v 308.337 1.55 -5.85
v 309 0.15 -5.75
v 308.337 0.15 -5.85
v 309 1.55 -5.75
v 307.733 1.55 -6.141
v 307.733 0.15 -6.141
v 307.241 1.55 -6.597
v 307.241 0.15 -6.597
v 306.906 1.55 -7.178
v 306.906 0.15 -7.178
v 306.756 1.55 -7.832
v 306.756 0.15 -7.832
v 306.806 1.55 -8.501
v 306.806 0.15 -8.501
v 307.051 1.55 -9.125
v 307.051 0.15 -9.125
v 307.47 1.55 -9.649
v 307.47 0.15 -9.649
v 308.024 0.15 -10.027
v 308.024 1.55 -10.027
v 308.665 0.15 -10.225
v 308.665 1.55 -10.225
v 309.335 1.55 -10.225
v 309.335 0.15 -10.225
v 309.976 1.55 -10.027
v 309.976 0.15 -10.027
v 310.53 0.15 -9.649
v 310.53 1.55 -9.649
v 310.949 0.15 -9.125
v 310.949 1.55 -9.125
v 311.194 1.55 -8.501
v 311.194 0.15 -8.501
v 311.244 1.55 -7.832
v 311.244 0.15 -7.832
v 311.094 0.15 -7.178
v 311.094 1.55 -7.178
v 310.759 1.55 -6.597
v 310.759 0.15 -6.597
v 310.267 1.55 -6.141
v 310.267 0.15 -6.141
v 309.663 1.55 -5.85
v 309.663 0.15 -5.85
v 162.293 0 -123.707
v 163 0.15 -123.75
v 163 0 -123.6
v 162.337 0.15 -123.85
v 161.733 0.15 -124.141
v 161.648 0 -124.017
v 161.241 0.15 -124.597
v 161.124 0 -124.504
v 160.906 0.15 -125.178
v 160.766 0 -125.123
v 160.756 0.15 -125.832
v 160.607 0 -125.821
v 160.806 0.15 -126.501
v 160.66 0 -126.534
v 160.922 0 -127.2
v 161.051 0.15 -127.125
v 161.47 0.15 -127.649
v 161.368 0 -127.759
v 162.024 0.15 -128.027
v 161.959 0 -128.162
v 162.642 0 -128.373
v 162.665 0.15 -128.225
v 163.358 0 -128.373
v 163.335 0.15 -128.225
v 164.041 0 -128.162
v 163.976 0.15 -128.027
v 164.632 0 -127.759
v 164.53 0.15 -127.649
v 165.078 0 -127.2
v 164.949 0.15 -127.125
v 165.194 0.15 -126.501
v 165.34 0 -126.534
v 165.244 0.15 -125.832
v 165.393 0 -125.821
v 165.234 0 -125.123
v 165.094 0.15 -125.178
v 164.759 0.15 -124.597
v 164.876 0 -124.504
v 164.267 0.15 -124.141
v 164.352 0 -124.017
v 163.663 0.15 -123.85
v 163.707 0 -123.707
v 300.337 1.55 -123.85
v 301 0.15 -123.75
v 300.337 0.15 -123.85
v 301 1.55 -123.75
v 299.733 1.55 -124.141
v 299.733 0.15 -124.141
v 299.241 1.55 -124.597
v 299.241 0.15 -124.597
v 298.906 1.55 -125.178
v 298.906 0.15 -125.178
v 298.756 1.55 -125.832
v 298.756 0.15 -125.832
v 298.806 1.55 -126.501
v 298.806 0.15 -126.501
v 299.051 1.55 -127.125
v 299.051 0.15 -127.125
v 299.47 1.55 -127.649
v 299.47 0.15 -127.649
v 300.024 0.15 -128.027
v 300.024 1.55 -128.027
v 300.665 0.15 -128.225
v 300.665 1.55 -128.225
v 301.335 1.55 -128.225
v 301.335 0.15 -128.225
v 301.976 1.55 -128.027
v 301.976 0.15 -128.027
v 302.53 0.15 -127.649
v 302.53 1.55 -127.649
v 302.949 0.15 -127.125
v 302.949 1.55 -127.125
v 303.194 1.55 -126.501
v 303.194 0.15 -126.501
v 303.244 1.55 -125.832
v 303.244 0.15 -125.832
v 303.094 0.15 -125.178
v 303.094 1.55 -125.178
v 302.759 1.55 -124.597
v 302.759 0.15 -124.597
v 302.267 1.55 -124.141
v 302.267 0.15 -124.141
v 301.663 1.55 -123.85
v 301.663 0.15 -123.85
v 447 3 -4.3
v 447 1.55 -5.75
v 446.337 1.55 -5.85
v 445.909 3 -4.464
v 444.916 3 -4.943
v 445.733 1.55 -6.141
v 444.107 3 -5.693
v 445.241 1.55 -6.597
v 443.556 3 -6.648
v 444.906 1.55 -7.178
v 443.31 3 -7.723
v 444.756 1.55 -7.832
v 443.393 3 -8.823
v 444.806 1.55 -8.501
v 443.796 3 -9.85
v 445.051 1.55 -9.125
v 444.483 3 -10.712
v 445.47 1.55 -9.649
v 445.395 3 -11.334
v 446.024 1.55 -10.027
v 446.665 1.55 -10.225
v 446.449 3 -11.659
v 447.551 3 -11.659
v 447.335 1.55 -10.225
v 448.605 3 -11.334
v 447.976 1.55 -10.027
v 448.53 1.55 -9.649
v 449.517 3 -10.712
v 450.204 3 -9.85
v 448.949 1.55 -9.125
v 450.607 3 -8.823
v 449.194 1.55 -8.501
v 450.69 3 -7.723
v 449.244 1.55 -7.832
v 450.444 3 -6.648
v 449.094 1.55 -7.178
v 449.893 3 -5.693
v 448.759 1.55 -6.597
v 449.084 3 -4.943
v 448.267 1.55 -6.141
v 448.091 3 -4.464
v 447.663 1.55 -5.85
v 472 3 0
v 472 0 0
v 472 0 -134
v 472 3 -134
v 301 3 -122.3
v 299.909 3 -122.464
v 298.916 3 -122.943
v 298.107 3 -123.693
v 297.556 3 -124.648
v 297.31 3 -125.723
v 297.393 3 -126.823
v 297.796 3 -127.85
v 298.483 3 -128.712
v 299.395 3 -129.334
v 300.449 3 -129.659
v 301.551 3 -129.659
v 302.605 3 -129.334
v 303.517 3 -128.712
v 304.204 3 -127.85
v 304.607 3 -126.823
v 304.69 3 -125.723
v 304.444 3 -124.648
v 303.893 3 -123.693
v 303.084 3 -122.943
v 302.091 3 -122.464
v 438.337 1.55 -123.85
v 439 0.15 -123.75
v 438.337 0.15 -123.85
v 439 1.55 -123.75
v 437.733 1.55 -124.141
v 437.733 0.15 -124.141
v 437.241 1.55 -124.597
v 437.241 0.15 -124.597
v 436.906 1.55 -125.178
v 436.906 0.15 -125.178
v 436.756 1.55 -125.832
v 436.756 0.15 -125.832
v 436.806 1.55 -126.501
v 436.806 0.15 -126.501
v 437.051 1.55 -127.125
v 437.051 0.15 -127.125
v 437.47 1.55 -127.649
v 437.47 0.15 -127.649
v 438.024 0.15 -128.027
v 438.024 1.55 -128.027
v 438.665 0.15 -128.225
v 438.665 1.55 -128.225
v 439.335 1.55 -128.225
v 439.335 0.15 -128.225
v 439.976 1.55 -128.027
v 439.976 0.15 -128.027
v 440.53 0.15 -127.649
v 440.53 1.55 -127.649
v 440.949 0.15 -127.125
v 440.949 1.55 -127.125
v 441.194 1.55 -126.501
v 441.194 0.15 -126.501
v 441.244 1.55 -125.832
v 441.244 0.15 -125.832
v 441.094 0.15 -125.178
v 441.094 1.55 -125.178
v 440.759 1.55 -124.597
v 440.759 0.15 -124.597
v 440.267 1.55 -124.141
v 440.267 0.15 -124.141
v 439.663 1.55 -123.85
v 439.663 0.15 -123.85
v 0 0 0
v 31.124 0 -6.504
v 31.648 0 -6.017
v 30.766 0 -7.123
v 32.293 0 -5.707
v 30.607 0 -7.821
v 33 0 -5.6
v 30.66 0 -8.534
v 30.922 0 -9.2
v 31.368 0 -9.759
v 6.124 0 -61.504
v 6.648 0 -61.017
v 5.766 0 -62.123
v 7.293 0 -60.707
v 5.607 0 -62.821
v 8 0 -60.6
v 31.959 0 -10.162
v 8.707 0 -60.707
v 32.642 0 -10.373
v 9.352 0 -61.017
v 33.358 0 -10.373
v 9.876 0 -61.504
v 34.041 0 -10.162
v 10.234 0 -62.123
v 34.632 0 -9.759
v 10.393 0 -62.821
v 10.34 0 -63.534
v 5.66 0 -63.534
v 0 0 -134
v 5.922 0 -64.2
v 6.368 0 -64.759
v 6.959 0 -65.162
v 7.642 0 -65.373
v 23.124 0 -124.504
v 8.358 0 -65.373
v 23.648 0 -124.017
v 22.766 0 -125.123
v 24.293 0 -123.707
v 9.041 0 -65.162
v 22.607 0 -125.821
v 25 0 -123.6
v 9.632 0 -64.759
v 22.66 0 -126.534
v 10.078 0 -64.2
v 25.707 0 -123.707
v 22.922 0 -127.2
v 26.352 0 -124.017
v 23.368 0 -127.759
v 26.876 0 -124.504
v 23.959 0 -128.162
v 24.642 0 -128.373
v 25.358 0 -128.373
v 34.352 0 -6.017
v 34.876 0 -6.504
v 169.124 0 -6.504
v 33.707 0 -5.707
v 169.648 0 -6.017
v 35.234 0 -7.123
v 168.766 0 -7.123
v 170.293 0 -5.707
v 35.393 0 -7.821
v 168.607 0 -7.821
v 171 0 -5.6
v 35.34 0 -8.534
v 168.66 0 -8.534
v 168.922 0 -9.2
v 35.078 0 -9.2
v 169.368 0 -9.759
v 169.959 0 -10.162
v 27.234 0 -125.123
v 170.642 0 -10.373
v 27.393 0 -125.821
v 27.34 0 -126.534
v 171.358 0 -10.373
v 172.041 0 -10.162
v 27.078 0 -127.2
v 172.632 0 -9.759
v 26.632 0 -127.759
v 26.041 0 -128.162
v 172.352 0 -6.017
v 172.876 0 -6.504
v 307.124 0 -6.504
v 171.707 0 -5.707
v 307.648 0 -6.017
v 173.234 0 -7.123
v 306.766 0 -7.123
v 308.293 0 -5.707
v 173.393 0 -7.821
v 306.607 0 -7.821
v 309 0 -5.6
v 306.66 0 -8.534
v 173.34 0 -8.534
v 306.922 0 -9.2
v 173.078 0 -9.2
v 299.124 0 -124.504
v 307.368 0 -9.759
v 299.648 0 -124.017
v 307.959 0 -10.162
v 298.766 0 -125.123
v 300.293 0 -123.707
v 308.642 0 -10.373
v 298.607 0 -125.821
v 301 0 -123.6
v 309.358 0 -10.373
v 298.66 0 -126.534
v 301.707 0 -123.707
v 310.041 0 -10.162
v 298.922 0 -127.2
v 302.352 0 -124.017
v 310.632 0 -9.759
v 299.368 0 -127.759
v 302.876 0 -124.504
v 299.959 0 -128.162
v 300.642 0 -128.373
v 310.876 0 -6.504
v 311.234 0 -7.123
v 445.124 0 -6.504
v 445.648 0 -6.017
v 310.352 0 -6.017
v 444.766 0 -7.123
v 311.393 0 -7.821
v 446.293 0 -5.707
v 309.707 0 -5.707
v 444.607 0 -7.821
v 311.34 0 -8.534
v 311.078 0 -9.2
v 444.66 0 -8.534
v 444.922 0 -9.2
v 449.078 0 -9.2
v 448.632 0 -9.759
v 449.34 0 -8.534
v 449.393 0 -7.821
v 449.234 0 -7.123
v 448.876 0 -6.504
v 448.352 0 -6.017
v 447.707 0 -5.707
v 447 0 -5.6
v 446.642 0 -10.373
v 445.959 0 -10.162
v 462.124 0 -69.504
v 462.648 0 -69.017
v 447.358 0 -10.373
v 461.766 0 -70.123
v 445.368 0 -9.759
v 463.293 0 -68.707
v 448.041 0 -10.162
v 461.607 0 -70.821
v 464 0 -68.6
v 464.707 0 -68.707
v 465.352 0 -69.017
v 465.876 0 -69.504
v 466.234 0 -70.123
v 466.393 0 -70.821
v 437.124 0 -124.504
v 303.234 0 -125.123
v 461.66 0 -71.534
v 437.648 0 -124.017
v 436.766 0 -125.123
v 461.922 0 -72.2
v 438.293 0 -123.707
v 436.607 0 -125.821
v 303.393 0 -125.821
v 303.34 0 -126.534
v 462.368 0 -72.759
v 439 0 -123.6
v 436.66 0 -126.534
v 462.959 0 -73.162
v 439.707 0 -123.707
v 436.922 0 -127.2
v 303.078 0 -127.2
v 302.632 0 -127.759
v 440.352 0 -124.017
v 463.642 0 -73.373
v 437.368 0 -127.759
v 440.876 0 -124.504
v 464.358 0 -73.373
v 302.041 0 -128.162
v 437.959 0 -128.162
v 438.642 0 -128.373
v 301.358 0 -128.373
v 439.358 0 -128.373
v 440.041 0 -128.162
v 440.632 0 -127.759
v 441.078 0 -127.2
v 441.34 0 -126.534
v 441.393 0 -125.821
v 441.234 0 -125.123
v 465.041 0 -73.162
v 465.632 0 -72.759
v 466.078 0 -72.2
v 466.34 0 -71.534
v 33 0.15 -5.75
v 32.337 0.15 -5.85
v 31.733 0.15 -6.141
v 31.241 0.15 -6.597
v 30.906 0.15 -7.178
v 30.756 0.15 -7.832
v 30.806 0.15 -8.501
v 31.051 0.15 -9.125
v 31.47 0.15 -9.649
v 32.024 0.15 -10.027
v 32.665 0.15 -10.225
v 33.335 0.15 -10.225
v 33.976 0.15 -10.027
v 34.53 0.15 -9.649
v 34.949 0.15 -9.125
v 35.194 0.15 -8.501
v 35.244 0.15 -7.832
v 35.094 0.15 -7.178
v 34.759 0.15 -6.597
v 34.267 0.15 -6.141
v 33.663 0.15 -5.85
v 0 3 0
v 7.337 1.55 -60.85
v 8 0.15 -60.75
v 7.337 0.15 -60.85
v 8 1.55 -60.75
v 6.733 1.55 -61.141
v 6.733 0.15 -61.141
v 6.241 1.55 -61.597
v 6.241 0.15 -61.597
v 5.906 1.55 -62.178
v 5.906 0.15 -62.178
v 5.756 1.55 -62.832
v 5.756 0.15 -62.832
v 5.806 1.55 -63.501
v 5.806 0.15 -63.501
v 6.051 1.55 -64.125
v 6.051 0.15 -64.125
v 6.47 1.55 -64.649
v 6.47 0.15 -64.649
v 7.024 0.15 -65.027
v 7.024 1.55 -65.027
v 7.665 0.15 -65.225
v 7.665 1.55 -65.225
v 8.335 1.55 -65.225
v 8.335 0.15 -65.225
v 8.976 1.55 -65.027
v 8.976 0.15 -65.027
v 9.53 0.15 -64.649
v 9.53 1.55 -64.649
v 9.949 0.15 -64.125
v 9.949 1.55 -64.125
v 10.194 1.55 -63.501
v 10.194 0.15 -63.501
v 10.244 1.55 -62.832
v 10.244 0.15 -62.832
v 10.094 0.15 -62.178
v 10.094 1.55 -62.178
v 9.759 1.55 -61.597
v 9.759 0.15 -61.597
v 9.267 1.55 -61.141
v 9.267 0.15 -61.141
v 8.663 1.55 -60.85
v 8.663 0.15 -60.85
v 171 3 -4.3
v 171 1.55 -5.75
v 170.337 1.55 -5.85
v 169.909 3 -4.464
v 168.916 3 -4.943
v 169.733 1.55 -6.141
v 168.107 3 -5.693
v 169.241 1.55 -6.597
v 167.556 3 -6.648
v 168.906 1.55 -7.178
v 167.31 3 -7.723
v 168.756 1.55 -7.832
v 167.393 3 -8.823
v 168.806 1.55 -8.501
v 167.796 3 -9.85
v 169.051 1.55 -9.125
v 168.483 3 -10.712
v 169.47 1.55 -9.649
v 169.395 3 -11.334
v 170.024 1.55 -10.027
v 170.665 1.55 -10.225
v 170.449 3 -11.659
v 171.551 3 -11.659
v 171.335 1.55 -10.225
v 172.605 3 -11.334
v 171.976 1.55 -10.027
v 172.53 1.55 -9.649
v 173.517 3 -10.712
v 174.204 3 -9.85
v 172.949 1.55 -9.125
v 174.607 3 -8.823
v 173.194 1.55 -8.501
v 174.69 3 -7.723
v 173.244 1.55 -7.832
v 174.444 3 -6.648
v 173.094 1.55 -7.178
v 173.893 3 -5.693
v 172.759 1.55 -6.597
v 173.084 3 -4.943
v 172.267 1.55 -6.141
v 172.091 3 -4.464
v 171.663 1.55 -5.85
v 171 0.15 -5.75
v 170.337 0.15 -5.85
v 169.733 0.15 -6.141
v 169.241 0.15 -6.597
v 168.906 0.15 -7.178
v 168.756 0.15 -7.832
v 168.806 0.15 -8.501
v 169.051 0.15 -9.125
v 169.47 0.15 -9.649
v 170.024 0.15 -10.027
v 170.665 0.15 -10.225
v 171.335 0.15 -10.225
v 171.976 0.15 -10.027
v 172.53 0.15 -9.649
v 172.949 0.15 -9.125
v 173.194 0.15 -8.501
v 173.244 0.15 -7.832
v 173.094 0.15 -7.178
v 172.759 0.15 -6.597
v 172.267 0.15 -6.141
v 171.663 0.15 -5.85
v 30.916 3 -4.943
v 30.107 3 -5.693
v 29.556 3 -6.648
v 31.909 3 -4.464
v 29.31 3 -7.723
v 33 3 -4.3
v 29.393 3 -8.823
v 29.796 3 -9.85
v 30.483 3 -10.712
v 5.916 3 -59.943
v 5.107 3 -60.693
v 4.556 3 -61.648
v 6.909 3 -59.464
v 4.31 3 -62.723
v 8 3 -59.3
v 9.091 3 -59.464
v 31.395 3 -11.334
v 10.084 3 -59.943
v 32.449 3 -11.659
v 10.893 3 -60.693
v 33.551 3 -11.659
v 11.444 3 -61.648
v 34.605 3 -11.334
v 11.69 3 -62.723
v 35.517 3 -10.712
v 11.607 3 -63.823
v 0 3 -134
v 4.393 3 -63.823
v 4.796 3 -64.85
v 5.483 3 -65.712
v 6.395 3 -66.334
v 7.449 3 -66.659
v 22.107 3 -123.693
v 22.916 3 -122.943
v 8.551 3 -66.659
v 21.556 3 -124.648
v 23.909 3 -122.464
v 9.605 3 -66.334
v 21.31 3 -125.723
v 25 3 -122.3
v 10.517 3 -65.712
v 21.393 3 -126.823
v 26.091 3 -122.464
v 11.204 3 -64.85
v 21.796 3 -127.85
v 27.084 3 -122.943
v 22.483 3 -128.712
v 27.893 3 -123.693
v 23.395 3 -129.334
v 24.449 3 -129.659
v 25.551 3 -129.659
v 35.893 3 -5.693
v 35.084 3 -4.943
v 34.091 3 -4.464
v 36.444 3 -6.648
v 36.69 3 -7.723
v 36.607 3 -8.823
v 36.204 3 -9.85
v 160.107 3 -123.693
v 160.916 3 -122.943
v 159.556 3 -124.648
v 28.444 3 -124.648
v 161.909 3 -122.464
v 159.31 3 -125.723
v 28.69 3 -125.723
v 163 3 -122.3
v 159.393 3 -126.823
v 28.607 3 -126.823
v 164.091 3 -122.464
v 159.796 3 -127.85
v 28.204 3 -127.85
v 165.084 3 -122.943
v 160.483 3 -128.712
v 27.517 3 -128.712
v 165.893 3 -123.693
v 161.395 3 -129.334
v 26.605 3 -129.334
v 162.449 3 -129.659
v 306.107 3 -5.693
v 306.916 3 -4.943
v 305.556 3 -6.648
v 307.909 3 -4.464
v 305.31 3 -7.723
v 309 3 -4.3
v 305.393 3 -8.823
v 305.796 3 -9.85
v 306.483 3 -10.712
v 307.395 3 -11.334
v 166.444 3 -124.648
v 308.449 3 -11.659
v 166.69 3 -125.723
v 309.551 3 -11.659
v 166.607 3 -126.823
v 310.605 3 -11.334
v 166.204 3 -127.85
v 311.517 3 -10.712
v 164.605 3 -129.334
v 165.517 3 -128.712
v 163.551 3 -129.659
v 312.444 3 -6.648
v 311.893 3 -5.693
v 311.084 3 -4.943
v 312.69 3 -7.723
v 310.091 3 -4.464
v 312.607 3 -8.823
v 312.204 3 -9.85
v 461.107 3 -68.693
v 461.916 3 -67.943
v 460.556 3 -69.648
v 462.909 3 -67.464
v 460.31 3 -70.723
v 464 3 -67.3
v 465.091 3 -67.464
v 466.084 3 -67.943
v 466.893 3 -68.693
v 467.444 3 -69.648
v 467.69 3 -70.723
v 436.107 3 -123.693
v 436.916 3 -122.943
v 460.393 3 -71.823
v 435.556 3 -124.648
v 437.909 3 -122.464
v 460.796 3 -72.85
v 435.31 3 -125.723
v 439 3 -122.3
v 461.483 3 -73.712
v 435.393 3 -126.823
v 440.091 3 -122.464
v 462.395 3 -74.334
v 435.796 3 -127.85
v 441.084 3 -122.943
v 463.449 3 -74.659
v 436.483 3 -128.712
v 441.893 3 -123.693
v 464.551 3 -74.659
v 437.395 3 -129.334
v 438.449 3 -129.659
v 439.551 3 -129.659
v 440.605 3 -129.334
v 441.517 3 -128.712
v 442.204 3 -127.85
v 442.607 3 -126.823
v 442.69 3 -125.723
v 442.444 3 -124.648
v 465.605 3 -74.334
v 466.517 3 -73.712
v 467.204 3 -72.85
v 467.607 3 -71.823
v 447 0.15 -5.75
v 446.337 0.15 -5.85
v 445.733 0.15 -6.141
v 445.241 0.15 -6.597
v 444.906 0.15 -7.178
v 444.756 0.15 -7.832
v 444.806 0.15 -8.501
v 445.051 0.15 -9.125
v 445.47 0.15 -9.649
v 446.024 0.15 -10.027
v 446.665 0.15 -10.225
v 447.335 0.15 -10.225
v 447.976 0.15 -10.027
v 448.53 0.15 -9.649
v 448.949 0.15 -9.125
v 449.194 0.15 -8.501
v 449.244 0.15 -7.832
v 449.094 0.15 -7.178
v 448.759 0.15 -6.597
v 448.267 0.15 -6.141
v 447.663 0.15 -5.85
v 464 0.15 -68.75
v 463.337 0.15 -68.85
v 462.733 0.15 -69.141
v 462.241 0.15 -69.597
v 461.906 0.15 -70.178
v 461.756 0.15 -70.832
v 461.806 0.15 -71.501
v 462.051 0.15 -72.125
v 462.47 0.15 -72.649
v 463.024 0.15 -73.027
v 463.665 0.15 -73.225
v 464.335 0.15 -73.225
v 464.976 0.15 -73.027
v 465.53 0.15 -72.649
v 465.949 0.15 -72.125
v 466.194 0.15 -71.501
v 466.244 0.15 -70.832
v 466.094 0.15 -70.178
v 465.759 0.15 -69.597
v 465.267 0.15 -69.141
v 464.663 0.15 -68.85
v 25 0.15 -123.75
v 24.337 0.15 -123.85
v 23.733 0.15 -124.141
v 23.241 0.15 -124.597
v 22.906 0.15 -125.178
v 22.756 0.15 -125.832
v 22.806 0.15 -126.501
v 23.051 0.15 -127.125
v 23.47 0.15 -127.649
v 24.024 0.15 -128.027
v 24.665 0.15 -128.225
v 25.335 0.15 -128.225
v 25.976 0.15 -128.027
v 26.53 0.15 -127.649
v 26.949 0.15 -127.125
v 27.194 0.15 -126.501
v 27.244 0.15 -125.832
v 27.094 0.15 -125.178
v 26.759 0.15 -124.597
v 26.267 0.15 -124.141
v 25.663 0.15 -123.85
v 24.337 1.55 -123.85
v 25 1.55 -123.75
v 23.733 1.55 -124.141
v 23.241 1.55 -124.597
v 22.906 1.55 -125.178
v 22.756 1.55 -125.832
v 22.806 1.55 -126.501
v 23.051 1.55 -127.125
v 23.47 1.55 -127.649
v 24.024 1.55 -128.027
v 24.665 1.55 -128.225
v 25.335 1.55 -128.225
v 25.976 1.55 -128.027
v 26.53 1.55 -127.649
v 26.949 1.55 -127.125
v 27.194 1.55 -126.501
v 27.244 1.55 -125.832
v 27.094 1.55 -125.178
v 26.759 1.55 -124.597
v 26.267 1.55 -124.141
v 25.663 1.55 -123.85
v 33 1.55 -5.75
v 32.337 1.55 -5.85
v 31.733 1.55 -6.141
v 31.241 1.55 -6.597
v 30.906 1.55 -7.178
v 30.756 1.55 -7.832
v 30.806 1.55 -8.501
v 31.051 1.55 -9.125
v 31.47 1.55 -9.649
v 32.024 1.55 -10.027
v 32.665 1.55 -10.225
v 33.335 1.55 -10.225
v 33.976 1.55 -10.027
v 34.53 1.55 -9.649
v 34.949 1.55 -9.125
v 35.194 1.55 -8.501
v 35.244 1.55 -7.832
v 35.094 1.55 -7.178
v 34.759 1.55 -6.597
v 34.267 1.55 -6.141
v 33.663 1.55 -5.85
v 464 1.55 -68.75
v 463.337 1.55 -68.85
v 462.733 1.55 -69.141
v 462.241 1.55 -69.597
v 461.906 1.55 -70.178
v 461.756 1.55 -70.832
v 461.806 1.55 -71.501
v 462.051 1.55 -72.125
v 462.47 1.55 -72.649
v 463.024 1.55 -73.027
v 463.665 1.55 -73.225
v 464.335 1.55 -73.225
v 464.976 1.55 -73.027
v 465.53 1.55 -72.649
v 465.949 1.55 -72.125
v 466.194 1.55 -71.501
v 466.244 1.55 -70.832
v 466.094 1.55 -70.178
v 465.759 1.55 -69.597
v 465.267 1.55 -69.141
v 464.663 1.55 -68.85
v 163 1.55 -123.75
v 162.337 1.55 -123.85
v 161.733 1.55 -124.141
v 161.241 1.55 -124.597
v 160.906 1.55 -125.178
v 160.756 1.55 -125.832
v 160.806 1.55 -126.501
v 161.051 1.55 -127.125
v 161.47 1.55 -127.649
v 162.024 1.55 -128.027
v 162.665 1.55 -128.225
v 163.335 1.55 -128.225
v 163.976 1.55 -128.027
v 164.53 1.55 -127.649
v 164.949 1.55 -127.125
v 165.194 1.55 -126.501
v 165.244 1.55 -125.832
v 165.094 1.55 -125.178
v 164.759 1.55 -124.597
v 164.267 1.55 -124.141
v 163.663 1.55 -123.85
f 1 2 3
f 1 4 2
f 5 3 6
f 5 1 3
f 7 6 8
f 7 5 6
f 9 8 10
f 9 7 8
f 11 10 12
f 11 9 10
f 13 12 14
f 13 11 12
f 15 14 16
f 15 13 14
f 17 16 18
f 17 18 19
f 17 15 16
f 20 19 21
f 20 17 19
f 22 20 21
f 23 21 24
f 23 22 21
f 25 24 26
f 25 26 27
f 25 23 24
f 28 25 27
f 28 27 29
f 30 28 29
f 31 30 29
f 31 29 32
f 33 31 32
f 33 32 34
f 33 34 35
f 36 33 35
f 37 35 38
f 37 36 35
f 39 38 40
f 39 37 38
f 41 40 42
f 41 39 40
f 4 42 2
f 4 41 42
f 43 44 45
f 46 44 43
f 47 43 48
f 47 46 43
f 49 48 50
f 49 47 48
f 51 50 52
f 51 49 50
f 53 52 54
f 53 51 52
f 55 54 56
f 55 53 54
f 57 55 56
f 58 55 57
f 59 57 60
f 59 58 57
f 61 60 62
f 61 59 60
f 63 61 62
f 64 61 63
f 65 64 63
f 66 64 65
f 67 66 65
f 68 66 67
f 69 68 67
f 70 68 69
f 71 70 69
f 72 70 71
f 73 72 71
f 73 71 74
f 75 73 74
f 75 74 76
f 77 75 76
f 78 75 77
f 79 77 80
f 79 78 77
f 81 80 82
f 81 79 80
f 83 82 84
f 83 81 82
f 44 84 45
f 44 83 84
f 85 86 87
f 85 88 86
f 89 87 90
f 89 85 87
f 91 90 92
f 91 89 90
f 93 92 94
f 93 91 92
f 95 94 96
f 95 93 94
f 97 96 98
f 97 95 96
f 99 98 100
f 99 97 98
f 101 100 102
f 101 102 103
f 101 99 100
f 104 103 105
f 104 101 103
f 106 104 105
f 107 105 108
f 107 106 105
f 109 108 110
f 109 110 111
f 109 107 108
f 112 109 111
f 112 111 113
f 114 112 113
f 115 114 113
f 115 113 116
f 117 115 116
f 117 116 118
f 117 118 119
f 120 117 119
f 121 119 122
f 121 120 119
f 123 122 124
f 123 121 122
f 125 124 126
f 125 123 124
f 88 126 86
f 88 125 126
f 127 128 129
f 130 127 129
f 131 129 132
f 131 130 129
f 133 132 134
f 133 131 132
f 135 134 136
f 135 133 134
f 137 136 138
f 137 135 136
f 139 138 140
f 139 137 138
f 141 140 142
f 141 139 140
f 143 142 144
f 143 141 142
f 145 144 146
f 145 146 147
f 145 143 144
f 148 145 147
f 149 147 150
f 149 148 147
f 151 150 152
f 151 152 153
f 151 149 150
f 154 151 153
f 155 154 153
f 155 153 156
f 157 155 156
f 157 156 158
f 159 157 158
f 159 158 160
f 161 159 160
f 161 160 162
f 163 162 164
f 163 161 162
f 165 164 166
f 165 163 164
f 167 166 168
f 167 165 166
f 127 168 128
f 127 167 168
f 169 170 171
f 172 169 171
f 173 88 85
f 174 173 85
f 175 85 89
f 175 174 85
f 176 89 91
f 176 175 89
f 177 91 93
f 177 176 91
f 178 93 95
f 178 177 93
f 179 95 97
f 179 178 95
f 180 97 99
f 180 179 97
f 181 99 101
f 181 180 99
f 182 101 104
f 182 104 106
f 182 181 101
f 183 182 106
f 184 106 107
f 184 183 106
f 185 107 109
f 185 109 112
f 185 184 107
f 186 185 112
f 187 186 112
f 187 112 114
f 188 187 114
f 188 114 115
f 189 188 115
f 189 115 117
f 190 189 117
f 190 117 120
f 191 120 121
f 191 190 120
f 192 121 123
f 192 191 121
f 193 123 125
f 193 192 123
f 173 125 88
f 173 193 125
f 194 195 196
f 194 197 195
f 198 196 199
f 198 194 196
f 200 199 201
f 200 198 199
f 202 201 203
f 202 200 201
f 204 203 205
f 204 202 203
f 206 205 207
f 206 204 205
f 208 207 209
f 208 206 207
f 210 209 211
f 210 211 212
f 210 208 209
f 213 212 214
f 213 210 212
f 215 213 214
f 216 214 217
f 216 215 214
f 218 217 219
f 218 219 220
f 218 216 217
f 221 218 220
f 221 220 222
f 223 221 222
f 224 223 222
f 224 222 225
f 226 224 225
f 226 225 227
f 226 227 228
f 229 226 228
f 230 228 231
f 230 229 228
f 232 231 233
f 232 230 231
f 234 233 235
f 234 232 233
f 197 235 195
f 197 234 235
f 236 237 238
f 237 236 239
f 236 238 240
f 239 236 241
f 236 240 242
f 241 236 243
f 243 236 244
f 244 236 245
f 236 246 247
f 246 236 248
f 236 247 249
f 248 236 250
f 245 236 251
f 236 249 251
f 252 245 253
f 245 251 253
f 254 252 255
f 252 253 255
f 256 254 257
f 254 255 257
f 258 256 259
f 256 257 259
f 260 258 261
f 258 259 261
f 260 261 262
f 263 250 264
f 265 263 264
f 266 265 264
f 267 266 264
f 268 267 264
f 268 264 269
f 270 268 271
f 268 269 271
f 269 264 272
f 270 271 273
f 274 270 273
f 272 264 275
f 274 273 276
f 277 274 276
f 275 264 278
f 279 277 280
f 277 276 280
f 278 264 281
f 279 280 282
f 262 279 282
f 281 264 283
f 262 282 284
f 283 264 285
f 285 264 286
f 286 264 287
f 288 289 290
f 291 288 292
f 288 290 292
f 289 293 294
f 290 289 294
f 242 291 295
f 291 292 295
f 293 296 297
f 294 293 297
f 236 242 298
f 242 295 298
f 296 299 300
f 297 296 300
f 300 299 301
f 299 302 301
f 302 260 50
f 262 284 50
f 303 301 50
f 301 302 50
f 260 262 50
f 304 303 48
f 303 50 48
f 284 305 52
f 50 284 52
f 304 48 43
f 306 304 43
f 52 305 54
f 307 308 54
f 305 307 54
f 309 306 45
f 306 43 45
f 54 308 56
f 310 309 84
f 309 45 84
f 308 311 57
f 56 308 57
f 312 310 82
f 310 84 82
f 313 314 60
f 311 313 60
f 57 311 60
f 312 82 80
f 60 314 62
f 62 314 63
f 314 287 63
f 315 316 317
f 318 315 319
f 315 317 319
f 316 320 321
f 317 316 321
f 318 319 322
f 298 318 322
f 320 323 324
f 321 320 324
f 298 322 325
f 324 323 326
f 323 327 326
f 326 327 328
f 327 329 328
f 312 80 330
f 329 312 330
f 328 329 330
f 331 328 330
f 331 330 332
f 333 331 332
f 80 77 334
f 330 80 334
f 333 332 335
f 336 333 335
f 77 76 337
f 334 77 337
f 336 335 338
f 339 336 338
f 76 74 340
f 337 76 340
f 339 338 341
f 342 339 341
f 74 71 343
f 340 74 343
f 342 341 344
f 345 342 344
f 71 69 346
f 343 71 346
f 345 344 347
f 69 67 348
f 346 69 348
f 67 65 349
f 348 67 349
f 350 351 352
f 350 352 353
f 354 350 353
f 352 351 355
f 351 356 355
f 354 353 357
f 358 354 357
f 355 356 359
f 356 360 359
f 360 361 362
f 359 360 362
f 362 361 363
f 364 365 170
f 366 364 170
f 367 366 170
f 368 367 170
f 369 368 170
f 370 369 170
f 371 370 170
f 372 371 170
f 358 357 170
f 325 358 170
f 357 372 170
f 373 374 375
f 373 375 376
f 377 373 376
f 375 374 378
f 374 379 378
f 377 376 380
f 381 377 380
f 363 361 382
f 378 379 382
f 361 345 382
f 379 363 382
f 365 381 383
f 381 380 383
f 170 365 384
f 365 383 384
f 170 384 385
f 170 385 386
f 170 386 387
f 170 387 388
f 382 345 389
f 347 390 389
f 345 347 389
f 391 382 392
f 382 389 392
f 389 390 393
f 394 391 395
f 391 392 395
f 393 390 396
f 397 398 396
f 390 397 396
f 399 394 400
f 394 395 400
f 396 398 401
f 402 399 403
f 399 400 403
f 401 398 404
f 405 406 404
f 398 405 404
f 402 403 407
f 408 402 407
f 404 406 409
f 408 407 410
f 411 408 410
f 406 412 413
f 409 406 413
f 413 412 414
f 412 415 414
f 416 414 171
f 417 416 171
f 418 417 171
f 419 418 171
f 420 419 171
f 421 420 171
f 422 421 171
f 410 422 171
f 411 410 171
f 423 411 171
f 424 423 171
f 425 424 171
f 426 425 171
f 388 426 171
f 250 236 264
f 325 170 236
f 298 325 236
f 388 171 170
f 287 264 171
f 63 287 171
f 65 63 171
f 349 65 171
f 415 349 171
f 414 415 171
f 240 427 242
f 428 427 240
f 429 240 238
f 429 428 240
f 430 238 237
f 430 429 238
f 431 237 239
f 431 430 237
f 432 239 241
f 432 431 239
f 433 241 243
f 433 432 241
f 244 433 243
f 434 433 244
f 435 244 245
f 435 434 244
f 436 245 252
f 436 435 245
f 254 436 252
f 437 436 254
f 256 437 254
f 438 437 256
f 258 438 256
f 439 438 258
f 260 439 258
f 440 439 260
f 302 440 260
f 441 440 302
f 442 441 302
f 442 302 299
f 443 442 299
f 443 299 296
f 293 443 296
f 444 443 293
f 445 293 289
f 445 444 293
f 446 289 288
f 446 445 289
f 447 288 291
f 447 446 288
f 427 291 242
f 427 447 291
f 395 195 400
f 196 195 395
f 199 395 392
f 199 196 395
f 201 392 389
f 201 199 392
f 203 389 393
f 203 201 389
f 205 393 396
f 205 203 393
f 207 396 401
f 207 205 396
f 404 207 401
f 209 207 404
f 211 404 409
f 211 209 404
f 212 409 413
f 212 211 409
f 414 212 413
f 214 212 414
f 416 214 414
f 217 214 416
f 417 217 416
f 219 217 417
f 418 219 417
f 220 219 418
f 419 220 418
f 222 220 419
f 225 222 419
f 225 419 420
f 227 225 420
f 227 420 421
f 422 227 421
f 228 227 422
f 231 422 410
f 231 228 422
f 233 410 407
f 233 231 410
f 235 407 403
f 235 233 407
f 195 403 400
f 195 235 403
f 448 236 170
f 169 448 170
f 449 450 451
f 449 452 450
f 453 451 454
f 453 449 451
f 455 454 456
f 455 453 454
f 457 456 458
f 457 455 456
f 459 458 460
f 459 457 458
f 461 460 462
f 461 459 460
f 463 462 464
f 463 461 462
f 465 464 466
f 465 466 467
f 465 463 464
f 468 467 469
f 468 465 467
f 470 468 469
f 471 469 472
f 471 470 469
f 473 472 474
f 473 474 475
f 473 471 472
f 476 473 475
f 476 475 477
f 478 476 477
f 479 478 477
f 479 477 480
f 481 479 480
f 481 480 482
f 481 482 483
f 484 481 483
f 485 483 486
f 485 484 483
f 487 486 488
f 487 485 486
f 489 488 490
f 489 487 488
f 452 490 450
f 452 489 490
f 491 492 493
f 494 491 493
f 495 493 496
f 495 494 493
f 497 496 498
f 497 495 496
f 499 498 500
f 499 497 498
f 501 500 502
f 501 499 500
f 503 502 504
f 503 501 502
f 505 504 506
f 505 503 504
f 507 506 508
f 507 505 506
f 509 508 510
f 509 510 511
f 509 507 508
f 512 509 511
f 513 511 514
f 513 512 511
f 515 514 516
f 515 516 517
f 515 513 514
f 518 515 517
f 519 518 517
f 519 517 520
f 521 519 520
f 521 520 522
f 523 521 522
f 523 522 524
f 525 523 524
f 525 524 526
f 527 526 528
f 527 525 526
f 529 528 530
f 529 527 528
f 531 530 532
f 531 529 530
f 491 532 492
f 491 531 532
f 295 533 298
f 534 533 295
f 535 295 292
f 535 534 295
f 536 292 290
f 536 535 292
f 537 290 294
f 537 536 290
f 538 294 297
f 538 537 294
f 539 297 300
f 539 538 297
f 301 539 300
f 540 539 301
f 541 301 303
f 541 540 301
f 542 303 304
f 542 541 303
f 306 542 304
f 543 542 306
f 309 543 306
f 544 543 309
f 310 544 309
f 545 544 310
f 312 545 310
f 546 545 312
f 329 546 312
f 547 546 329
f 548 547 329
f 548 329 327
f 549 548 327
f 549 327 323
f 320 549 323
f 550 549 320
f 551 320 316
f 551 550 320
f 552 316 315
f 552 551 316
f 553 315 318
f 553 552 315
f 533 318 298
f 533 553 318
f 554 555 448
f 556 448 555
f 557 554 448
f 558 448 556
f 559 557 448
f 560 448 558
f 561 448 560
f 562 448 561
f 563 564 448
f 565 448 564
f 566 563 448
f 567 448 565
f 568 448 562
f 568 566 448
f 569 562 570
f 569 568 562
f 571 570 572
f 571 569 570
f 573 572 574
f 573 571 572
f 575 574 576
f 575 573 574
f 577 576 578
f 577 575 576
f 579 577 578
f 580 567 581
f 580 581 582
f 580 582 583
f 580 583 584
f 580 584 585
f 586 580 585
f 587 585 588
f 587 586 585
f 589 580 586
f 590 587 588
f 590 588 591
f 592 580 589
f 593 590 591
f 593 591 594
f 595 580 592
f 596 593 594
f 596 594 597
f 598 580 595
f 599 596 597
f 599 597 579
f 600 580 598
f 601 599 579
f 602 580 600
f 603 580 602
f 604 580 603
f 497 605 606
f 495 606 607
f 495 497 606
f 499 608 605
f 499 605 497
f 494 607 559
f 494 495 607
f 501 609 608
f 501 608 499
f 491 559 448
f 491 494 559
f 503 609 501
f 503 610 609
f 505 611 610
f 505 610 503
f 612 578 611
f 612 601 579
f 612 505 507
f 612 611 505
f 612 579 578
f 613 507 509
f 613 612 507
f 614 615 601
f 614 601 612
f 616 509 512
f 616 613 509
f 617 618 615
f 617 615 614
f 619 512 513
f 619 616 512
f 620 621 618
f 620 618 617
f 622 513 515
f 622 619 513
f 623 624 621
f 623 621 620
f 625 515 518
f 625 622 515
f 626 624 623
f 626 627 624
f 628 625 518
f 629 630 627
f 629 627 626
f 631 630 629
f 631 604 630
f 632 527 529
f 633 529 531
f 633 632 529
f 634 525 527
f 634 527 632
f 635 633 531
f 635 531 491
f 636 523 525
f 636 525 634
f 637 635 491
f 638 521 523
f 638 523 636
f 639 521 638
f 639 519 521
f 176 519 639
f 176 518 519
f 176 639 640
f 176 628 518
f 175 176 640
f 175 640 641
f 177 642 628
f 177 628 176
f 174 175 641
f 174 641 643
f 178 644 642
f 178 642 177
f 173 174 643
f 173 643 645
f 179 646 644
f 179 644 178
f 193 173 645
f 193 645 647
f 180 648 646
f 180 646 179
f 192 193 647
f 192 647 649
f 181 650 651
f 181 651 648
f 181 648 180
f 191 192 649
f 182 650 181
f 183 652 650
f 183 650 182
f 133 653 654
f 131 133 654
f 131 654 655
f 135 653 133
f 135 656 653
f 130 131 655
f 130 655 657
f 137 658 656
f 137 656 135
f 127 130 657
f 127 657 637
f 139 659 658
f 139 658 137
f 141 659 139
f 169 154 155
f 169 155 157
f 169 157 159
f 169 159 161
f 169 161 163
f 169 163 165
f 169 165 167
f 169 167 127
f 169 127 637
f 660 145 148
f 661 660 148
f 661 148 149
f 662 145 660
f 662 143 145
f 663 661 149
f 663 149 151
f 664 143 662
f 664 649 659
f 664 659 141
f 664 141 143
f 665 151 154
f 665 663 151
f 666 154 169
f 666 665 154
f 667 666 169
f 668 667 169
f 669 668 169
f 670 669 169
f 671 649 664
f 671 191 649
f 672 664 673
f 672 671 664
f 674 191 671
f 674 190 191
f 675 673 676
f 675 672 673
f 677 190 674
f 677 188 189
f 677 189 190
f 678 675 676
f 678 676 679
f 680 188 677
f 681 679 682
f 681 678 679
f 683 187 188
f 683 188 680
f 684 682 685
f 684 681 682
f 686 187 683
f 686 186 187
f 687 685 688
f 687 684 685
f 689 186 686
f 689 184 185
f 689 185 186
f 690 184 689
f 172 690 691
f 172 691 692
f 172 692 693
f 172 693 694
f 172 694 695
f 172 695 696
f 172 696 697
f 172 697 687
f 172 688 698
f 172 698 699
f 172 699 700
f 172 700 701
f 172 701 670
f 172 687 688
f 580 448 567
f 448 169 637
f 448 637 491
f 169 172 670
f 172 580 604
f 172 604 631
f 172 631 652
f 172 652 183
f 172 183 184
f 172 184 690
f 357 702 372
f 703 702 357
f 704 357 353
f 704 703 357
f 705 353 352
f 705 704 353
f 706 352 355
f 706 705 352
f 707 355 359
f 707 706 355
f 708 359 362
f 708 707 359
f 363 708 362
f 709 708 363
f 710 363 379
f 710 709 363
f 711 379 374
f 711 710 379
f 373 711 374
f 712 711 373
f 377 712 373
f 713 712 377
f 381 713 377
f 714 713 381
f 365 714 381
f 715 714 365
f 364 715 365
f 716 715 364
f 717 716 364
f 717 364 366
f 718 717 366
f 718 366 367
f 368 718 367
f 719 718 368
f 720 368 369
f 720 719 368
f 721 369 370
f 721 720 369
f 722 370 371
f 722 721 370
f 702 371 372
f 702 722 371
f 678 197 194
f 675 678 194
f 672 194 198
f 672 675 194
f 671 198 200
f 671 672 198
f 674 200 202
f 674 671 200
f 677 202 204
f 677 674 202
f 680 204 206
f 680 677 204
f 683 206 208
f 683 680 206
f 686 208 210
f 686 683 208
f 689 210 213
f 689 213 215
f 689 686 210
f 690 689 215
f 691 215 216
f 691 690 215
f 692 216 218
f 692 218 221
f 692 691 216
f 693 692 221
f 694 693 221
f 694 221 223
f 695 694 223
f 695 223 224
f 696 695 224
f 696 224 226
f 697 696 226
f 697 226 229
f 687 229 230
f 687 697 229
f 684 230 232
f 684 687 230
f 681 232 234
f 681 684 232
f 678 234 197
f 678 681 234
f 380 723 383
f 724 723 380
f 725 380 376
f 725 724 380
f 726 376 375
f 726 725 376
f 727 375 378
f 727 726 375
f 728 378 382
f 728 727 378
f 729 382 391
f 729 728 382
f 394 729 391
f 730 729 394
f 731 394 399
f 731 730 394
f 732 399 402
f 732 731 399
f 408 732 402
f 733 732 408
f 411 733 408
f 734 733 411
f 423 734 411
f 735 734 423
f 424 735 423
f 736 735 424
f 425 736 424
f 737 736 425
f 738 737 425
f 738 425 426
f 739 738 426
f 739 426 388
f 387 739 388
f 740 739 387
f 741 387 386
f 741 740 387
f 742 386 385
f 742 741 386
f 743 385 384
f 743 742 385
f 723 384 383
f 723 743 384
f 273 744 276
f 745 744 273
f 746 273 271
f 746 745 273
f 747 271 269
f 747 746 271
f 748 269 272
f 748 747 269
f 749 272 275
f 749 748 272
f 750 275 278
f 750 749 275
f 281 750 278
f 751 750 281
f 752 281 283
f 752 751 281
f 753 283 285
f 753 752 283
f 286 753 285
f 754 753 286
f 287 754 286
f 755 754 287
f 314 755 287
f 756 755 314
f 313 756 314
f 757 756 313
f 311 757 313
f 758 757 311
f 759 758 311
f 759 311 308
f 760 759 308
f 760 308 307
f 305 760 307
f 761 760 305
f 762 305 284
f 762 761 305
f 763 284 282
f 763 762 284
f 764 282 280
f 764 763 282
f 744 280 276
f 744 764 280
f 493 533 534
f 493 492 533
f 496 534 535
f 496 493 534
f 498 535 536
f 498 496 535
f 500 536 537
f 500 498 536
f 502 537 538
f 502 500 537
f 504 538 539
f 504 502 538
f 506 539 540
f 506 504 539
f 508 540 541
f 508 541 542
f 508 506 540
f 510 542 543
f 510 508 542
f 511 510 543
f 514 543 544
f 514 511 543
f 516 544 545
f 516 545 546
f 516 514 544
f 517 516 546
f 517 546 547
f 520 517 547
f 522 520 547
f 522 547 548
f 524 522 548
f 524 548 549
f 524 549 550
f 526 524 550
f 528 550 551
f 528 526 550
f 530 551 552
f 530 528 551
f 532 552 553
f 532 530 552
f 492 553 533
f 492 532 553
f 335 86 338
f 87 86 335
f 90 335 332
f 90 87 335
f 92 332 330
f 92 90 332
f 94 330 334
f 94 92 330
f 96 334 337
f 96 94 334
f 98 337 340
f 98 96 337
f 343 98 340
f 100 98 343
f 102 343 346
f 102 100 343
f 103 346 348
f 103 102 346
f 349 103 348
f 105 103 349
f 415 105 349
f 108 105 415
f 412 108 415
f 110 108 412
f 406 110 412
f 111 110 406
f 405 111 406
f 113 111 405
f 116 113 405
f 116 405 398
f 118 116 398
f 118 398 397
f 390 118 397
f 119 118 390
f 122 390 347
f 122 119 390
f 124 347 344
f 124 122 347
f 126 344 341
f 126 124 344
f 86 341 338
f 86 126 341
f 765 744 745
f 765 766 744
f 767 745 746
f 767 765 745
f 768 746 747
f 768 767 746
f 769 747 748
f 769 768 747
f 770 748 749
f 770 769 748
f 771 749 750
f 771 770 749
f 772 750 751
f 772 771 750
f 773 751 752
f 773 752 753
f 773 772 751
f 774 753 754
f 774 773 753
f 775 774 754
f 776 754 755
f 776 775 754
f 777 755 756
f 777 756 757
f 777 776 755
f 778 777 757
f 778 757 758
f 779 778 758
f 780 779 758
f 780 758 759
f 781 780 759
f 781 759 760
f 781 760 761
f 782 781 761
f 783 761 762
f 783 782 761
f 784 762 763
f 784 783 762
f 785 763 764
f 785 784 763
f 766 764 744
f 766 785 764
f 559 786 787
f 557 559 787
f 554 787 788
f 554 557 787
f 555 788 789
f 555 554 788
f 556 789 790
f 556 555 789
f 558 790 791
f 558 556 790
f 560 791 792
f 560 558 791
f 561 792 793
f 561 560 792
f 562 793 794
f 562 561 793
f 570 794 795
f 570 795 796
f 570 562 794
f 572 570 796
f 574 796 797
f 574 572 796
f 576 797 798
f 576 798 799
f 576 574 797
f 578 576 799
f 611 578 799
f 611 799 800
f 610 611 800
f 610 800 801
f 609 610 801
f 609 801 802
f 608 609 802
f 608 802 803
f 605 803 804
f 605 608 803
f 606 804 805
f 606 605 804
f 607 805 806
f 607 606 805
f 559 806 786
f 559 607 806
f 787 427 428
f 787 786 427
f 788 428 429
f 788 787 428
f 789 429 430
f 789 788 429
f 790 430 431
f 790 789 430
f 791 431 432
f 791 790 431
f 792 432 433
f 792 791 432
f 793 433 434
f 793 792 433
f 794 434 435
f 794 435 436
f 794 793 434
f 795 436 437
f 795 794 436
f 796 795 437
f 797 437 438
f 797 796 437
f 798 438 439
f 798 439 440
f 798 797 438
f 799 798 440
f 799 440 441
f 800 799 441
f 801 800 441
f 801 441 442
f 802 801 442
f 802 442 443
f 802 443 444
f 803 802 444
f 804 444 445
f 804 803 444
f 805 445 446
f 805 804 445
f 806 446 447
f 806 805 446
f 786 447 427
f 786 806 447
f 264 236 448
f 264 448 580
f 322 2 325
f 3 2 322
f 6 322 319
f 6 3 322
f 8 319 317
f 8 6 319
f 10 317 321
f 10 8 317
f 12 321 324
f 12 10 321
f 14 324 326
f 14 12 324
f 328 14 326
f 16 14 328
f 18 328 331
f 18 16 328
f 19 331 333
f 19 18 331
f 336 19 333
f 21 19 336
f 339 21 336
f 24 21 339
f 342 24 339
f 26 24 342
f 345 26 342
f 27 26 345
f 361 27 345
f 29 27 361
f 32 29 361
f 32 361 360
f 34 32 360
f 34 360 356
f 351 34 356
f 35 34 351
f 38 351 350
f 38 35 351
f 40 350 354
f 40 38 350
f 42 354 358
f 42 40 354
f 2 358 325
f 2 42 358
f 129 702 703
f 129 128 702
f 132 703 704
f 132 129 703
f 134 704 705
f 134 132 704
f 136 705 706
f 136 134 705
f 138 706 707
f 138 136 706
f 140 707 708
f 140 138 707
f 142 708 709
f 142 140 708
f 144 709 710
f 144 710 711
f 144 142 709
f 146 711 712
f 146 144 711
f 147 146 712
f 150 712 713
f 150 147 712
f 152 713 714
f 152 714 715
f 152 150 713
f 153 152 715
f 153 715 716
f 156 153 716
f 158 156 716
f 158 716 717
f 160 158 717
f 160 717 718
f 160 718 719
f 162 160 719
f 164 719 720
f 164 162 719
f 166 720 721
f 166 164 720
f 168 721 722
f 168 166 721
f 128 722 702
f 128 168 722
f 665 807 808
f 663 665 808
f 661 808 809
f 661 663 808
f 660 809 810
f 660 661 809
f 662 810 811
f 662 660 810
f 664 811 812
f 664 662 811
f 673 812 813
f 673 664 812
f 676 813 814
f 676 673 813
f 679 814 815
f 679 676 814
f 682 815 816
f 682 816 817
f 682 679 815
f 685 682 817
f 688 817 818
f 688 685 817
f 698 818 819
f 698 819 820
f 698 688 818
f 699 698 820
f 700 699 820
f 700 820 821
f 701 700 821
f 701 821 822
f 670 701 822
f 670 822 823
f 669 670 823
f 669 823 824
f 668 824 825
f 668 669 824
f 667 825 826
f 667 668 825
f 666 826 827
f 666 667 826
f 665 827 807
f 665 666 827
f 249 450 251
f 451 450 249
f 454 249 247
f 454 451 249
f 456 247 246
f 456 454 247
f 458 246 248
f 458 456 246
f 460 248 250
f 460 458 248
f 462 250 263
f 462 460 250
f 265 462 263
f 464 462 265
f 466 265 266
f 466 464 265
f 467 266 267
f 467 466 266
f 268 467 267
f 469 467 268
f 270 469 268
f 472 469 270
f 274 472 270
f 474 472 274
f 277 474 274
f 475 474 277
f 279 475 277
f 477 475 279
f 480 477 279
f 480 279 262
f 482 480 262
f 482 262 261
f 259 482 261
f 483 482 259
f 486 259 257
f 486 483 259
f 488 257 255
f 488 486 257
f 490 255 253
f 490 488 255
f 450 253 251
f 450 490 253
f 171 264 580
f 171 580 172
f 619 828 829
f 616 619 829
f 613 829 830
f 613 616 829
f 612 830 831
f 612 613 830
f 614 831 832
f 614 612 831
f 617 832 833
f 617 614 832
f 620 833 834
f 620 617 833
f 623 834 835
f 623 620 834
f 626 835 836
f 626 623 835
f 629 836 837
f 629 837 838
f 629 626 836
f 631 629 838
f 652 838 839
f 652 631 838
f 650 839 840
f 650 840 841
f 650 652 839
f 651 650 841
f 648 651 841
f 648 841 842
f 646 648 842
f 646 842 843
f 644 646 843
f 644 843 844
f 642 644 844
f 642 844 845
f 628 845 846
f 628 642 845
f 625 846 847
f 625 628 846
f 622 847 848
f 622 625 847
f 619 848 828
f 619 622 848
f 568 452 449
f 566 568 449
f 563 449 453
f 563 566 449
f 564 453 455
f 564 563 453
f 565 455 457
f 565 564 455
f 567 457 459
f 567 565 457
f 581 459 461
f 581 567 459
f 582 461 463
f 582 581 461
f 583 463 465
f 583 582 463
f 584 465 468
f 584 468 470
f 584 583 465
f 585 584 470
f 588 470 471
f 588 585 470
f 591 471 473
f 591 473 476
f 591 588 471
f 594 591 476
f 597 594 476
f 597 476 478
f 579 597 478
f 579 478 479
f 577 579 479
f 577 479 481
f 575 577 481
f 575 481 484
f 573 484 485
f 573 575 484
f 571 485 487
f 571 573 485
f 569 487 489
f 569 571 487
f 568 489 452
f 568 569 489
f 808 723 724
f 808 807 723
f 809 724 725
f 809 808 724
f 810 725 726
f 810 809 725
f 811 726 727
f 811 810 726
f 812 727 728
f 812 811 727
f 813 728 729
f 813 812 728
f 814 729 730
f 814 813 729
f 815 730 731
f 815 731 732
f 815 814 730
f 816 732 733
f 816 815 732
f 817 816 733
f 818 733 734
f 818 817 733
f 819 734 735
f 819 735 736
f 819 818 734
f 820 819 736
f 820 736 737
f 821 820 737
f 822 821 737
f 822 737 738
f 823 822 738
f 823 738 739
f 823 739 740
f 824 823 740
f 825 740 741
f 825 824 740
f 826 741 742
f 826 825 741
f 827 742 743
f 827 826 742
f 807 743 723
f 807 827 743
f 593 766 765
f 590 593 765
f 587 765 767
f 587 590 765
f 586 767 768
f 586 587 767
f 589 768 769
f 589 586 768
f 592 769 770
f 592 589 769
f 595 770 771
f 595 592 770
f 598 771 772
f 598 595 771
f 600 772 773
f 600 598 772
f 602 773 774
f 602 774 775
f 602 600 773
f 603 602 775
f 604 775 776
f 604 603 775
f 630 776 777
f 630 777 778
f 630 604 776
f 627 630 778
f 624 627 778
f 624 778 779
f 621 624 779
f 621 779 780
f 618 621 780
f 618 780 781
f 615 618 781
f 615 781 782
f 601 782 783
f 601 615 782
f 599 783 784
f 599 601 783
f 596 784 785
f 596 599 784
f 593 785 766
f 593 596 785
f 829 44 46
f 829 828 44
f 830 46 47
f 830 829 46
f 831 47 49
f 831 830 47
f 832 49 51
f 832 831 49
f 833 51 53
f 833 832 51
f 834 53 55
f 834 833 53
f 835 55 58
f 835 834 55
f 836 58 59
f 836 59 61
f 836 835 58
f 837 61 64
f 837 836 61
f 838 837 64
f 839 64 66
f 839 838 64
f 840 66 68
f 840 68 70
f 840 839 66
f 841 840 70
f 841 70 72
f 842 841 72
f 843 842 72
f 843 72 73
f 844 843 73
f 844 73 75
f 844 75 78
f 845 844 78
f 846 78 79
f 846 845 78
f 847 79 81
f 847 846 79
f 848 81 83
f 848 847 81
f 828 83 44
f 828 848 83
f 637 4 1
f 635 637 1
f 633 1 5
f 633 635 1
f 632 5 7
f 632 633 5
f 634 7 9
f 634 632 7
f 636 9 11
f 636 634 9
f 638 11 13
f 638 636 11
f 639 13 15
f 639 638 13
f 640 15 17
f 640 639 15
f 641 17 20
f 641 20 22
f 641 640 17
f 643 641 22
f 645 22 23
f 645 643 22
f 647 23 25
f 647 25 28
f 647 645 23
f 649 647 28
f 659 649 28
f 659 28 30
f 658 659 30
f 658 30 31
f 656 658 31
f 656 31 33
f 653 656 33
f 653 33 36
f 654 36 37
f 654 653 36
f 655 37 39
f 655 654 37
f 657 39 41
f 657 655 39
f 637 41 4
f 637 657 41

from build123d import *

# Parameters (mm, degrees)
SKETCH_2_W                  = 472
SKETCH_2_H                  = 134
EXTRUDE_1_DEPTH             = 3
HOLE_WIZARD_M41_AT_2_COUNT  = 2
HOLE_WIZARD_M41_AT_2_PITCH  = 138
HOLE_WIZARD_M41_AT_3_COUNT  = 2
HOLE_WIZARD_M41_AT_3_PITCH  = 276
HOLE_WIZARD_M41_AT_4_COUNT  = 2
HOLE_WIZARD_M41_AT_4_PITCH  = 414
HOLE_WIZARD_M41_AT_5_COUNT  = 2
HOLE_WIZARD_M41_AT_5_PITCH  = 442.431915666
HOLE_WIZARD_M41_AT_6_COUNT  = 2
HOLE_WIZARD_M41_AT_6_PITCH  = 438.187174618
HOLE_WIZARD_M41_AT_7_COUNT  = 2
HOLE_WIZARD_M41_AT_7_PITCH  = 307.538615462
HOLE_WIZARD_M41_AT_8_COUNT  = 2
HOLE_WIZARD_M41_AT_8_PITCH  = 187.723200484
HOLE_WIZARD_M41_AT_9_COUNT  = 2
HOLE_WIZARD_M41_AT_9_PITCH  = 118.270875536
HOLE_WIZARD_M41_AT_10_COUNT = 2
HOLE_WIZARD_M41_AT_10_PITCH = 65.253352404


with BuildPart() as part:
    # Эскиз2 → Бобышка-Вытянуть1 (new body)
    with BuildSketch(Plane(origin=(0, 0, 0), x_dir=(1, 0, 0), z_dir=(0, 1, 0))):
        with Locations((236, 67)):
            Rectangle(SKETCH_2_W, SKETCH_2_H)
    extrude(amount=EXTRUDE_1_DEPTH)

    # Эскиз3 → Зенковка для винта с потайной головкой M41 (revolve, cut)
    with BuildSketch(Plane(origin=(25, 3, -126), x_dir=(0, 0, 1), z_dir=(1, 0, 0))):
        Polygon((0, 0), (0, 3), (2.4, 3), (2.25, 2.85), (2.25, 1.45), (3.7, 0), align=None)
    hole_wizard_m41 = revolve(axis=Axis((25, 9.35, -126), (0, -1, 0)), mode=Mode.SUBTRACT)

    # Зенковка для винта с потайной головкой M41 at 2: Зенковка для винта с потайной головкой M41 ×2
    with Locations(*[(i * HOLE_WIZARD_M41_AT_2_PITCH, 0, 0) for i in range(1, HOLE_WIZARD_M41_AT_2_COUNT)]):
        add(hole_wizard_m41, mode=Mode.SUBTRACT)

    # Зенковка для винта с потайной головкой M41 at 3: Зенковка для винта с потайной головкой M41 ×2
    with Locations(*[(i * HOLE_WIZARD_M41_AT_3_PITCH, 0, 0) for i in range(1, HOLE_WIZARD_M41_AT_3_COUNT)]):
        add(hole_wizard_m41, mode=Mode.SUBTRACT)

    # Зенковка для винта с потайной головкой M41 at 4: Зенковка для винта с потайной головкой M41 ×2
    with Locations(*[(i * HOLE_WIZARD_M41_AT_4_PITCH, 0, 0) for i in range(1, HOLE_WIZARD_M41_AT_4_COUNT)]):
        add(hole_wizard_m41, mode=Mode.SUBTRACT)

    # Зенковка для винта с потайной головкой M41 at 5: Зенковка для винта с потайной головкой M41 ×2
    with Locations(*[Vector(0.992243065, 0, 0.124312912) * (i * HOLE_WIZARD_M41_AT_5_PITCH) for i in range(1, HOLE_WIZARD_M41_AT_5_COUNT)]):
        add(hole_wizard_m41, mode=Mode.SUBTRACT)

    # Зенковка для винта с потайной головкой M41 at 6: Зенковка для винта с потайной головкой M41 ×2
    with Locations(*[Vector(0.963058767, 0, 0.269291314) * (i * HOLE_WIZARD_M41_AT_6_PITCH) for i in range(1, HOLE_WIZARD_M41_AT_6_COUNT)]):
        add(hole_wizard_m41, mode=Mode.SUBTRACT)

    # Зенковка для винта с потайной головкой M41 at 7: Зенковка для винта с потайной головкой M41 ×2
    with Locations(*[Vector(0.923461269, 0, 0.383691654) * (i * HOLE_WIZARD_M41_AT_7_PITCH) for i in range(1, HOLE_WIZARD_M41_AT_7_COUNT)]):
        add(hole_wizard_m41, mode=Mode.SUBTRACT)

    # Зенковка для винта с потайной головкой M41 at 8: Зенковка для винта с потайной головкой M41 ×2
    with Locations(*[Vector(0.777740842, 0, 0.628585064) * (i * HOLE_WIZARD_M41_AT_8_PITCH) for i in range(1, HOLE_WIZARD_M41_AT_8_COUNT)]):
        add(hole_wizard_m41, mode=Mode.SUBTRACT)

    # Зенковка для винта с потайной головкой M41 at 9: Зенковка для винта с потайной головкой M41 ×2
    with Locations(*[Vector(0.067641336, 0, 0.997709702) * (i * HOLE_WIZARD_M41_AT_9_PITCH) for i in range(1, HOLE_WIZARD_M41_AT_9_COUNT)]):
        add(hole_wizard_m41, mode=Mode.SUBTRACT)

    # Зенковка для винта с потайной головкой M41 at 10: Зенковка для винта с потайной головкой M41 ×2
    with Locations(*[Vector(-0.260523013, 0, 0.965467638) * (i * HOLE_WIZARD_M41_AT_10_PITCH) for i in range(1, HOLE_WIZARD_M41_AT_10_COUNT)]):
        add(hole_wizard_m41, mode=Mode.SUBTRACT)


solid = part.part
